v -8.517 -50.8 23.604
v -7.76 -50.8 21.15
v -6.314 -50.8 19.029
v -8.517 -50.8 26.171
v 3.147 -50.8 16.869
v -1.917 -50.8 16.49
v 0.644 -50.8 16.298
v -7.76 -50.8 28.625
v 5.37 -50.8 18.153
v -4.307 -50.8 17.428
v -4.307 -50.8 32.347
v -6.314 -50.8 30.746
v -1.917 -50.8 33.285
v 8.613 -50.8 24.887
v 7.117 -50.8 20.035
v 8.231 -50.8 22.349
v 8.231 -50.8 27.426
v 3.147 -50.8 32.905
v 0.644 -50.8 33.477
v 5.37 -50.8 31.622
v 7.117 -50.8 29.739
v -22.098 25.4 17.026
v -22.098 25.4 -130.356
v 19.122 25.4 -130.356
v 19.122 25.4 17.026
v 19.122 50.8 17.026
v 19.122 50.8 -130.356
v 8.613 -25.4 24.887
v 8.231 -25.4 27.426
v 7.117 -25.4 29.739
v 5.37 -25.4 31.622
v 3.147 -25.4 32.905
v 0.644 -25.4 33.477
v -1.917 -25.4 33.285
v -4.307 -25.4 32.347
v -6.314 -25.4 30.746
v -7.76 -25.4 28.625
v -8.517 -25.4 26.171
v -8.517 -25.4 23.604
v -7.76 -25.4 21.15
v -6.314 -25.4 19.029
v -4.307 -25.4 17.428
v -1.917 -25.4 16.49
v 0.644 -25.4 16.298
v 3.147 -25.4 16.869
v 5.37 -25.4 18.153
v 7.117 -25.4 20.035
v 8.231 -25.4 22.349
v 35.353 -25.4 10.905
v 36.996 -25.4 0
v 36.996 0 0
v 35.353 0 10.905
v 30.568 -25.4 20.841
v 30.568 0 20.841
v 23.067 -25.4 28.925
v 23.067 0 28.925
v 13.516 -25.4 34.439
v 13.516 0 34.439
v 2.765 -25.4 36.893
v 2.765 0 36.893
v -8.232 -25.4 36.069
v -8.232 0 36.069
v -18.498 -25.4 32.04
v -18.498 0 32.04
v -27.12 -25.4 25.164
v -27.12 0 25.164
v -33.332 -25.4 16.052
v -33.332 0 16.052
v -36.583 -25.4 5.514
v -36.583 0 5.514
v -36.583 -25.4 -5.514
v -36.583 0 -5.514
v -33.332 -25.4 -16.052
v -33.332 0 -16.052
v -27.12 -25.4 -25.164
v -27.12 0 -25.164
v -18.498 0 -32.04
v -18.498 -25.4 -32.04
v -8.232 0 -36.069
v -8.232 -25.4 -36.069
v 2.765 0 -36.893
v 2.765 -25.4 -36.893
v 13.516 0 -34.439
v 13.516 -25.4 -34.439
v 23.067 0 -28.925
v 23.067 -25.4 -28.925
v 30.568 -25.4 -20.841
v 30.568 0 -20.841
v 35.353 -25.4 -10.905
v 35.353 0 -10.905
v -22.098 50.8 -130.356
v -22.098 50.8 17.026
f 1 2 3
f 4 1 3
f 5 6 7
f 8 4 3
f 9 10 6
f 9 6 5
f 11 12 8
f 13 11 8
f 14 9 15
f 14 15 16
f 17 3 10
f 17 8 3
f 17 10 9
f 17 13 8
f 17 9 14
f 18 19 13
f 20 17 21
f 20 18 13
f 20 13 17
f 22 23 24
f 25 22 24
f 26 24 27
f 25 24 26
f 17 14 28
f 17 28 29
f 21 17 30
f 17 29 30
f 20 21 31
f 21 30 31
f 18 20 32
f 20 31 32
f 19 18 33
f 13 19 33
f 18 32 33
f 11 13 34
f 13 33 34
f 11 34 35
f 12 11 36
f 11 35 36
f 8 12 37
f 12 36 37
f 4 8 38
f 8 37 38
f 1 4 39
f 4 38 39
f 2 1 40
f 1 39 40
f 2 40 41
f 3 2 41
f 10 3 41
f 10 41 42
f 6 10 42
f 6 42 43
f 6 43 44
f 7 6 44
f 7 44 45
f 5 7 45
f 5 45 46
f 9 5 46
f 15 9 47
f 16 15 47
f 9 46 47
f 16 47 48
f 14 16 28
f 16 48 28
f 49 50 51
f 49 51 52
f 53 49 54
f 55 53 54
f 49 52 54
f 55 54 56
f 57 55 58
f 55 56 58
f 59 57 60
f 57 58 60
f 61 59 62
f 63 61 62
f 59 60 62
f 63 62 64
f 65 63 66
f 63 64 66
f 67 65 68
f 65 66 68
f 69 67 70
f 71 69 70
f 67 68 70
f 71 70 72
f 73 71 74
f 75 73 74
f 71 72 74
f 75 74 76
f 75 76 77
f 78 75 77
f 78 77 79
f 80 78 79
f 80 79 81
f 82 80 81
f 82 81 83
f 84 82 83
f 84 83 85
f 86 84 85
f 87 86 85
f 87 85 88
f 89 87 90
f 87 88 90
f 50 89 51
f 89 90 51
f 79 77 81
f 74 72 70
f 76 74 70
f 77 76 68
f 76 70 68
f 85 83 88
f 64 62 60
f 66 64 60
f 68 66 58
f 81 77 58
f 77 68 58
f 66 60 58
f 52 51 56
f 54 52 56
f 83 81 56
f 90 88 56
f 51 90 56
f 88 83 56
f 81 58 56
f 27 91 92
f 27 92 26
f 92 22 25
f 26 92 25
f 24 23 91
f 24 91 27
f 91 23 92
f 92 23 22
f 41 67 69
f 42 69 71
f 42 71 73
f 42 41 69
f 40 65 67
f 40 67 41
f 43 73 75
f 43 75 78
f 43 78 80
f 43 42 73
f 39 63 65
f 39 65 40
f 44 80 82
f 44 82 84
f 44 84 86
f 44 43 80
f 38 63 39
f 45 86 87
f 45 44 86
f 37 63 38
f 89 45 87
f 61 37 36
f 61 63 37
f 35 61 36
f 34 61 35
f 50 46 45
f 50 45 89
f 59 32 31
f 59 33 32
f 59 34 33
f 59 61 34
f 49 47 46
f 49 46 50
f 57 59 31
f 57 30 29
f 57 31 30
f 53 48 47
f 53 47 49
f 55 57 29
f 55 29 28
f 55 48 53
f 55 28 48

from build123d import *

# Parameters (mm, degrees)
F0_R     = 36.996281
F1_DEPTH = 25.4
F2_R     = 8.613361
F3_DEPTH = 25.4
F5_W     = 41.220195
F5_H     = 147.381902
F6_DEPTH = 25.4


with BuildPart() as f1:
    # F0 (on Front) → F1 (new body)
    with BuildSketch(Plane.XZ):
        Circle(F0_R)
    extrude(amount=F1_DEPTH)

    # F2 (on face) → F3 (join)
    with BuildSketch(Plane.XZ.offset(25.4)):
        with Locations((0, 24.887346)):
            Circle(F2_R)
    extrude(amount=F3_DEPTH)


with BuildPart() as f6:
    # F5 (on offset) → F6 (new body)
    with BuildSketch(Plane.XZ.offset(-25.4)):
        with Locations((-1.487699, -56.665361)):
            Rectangle(F5_W, F5_H)
    extrude(amount=-F6_DEPTH)


solid = Compound([f1.part, f6.part])
